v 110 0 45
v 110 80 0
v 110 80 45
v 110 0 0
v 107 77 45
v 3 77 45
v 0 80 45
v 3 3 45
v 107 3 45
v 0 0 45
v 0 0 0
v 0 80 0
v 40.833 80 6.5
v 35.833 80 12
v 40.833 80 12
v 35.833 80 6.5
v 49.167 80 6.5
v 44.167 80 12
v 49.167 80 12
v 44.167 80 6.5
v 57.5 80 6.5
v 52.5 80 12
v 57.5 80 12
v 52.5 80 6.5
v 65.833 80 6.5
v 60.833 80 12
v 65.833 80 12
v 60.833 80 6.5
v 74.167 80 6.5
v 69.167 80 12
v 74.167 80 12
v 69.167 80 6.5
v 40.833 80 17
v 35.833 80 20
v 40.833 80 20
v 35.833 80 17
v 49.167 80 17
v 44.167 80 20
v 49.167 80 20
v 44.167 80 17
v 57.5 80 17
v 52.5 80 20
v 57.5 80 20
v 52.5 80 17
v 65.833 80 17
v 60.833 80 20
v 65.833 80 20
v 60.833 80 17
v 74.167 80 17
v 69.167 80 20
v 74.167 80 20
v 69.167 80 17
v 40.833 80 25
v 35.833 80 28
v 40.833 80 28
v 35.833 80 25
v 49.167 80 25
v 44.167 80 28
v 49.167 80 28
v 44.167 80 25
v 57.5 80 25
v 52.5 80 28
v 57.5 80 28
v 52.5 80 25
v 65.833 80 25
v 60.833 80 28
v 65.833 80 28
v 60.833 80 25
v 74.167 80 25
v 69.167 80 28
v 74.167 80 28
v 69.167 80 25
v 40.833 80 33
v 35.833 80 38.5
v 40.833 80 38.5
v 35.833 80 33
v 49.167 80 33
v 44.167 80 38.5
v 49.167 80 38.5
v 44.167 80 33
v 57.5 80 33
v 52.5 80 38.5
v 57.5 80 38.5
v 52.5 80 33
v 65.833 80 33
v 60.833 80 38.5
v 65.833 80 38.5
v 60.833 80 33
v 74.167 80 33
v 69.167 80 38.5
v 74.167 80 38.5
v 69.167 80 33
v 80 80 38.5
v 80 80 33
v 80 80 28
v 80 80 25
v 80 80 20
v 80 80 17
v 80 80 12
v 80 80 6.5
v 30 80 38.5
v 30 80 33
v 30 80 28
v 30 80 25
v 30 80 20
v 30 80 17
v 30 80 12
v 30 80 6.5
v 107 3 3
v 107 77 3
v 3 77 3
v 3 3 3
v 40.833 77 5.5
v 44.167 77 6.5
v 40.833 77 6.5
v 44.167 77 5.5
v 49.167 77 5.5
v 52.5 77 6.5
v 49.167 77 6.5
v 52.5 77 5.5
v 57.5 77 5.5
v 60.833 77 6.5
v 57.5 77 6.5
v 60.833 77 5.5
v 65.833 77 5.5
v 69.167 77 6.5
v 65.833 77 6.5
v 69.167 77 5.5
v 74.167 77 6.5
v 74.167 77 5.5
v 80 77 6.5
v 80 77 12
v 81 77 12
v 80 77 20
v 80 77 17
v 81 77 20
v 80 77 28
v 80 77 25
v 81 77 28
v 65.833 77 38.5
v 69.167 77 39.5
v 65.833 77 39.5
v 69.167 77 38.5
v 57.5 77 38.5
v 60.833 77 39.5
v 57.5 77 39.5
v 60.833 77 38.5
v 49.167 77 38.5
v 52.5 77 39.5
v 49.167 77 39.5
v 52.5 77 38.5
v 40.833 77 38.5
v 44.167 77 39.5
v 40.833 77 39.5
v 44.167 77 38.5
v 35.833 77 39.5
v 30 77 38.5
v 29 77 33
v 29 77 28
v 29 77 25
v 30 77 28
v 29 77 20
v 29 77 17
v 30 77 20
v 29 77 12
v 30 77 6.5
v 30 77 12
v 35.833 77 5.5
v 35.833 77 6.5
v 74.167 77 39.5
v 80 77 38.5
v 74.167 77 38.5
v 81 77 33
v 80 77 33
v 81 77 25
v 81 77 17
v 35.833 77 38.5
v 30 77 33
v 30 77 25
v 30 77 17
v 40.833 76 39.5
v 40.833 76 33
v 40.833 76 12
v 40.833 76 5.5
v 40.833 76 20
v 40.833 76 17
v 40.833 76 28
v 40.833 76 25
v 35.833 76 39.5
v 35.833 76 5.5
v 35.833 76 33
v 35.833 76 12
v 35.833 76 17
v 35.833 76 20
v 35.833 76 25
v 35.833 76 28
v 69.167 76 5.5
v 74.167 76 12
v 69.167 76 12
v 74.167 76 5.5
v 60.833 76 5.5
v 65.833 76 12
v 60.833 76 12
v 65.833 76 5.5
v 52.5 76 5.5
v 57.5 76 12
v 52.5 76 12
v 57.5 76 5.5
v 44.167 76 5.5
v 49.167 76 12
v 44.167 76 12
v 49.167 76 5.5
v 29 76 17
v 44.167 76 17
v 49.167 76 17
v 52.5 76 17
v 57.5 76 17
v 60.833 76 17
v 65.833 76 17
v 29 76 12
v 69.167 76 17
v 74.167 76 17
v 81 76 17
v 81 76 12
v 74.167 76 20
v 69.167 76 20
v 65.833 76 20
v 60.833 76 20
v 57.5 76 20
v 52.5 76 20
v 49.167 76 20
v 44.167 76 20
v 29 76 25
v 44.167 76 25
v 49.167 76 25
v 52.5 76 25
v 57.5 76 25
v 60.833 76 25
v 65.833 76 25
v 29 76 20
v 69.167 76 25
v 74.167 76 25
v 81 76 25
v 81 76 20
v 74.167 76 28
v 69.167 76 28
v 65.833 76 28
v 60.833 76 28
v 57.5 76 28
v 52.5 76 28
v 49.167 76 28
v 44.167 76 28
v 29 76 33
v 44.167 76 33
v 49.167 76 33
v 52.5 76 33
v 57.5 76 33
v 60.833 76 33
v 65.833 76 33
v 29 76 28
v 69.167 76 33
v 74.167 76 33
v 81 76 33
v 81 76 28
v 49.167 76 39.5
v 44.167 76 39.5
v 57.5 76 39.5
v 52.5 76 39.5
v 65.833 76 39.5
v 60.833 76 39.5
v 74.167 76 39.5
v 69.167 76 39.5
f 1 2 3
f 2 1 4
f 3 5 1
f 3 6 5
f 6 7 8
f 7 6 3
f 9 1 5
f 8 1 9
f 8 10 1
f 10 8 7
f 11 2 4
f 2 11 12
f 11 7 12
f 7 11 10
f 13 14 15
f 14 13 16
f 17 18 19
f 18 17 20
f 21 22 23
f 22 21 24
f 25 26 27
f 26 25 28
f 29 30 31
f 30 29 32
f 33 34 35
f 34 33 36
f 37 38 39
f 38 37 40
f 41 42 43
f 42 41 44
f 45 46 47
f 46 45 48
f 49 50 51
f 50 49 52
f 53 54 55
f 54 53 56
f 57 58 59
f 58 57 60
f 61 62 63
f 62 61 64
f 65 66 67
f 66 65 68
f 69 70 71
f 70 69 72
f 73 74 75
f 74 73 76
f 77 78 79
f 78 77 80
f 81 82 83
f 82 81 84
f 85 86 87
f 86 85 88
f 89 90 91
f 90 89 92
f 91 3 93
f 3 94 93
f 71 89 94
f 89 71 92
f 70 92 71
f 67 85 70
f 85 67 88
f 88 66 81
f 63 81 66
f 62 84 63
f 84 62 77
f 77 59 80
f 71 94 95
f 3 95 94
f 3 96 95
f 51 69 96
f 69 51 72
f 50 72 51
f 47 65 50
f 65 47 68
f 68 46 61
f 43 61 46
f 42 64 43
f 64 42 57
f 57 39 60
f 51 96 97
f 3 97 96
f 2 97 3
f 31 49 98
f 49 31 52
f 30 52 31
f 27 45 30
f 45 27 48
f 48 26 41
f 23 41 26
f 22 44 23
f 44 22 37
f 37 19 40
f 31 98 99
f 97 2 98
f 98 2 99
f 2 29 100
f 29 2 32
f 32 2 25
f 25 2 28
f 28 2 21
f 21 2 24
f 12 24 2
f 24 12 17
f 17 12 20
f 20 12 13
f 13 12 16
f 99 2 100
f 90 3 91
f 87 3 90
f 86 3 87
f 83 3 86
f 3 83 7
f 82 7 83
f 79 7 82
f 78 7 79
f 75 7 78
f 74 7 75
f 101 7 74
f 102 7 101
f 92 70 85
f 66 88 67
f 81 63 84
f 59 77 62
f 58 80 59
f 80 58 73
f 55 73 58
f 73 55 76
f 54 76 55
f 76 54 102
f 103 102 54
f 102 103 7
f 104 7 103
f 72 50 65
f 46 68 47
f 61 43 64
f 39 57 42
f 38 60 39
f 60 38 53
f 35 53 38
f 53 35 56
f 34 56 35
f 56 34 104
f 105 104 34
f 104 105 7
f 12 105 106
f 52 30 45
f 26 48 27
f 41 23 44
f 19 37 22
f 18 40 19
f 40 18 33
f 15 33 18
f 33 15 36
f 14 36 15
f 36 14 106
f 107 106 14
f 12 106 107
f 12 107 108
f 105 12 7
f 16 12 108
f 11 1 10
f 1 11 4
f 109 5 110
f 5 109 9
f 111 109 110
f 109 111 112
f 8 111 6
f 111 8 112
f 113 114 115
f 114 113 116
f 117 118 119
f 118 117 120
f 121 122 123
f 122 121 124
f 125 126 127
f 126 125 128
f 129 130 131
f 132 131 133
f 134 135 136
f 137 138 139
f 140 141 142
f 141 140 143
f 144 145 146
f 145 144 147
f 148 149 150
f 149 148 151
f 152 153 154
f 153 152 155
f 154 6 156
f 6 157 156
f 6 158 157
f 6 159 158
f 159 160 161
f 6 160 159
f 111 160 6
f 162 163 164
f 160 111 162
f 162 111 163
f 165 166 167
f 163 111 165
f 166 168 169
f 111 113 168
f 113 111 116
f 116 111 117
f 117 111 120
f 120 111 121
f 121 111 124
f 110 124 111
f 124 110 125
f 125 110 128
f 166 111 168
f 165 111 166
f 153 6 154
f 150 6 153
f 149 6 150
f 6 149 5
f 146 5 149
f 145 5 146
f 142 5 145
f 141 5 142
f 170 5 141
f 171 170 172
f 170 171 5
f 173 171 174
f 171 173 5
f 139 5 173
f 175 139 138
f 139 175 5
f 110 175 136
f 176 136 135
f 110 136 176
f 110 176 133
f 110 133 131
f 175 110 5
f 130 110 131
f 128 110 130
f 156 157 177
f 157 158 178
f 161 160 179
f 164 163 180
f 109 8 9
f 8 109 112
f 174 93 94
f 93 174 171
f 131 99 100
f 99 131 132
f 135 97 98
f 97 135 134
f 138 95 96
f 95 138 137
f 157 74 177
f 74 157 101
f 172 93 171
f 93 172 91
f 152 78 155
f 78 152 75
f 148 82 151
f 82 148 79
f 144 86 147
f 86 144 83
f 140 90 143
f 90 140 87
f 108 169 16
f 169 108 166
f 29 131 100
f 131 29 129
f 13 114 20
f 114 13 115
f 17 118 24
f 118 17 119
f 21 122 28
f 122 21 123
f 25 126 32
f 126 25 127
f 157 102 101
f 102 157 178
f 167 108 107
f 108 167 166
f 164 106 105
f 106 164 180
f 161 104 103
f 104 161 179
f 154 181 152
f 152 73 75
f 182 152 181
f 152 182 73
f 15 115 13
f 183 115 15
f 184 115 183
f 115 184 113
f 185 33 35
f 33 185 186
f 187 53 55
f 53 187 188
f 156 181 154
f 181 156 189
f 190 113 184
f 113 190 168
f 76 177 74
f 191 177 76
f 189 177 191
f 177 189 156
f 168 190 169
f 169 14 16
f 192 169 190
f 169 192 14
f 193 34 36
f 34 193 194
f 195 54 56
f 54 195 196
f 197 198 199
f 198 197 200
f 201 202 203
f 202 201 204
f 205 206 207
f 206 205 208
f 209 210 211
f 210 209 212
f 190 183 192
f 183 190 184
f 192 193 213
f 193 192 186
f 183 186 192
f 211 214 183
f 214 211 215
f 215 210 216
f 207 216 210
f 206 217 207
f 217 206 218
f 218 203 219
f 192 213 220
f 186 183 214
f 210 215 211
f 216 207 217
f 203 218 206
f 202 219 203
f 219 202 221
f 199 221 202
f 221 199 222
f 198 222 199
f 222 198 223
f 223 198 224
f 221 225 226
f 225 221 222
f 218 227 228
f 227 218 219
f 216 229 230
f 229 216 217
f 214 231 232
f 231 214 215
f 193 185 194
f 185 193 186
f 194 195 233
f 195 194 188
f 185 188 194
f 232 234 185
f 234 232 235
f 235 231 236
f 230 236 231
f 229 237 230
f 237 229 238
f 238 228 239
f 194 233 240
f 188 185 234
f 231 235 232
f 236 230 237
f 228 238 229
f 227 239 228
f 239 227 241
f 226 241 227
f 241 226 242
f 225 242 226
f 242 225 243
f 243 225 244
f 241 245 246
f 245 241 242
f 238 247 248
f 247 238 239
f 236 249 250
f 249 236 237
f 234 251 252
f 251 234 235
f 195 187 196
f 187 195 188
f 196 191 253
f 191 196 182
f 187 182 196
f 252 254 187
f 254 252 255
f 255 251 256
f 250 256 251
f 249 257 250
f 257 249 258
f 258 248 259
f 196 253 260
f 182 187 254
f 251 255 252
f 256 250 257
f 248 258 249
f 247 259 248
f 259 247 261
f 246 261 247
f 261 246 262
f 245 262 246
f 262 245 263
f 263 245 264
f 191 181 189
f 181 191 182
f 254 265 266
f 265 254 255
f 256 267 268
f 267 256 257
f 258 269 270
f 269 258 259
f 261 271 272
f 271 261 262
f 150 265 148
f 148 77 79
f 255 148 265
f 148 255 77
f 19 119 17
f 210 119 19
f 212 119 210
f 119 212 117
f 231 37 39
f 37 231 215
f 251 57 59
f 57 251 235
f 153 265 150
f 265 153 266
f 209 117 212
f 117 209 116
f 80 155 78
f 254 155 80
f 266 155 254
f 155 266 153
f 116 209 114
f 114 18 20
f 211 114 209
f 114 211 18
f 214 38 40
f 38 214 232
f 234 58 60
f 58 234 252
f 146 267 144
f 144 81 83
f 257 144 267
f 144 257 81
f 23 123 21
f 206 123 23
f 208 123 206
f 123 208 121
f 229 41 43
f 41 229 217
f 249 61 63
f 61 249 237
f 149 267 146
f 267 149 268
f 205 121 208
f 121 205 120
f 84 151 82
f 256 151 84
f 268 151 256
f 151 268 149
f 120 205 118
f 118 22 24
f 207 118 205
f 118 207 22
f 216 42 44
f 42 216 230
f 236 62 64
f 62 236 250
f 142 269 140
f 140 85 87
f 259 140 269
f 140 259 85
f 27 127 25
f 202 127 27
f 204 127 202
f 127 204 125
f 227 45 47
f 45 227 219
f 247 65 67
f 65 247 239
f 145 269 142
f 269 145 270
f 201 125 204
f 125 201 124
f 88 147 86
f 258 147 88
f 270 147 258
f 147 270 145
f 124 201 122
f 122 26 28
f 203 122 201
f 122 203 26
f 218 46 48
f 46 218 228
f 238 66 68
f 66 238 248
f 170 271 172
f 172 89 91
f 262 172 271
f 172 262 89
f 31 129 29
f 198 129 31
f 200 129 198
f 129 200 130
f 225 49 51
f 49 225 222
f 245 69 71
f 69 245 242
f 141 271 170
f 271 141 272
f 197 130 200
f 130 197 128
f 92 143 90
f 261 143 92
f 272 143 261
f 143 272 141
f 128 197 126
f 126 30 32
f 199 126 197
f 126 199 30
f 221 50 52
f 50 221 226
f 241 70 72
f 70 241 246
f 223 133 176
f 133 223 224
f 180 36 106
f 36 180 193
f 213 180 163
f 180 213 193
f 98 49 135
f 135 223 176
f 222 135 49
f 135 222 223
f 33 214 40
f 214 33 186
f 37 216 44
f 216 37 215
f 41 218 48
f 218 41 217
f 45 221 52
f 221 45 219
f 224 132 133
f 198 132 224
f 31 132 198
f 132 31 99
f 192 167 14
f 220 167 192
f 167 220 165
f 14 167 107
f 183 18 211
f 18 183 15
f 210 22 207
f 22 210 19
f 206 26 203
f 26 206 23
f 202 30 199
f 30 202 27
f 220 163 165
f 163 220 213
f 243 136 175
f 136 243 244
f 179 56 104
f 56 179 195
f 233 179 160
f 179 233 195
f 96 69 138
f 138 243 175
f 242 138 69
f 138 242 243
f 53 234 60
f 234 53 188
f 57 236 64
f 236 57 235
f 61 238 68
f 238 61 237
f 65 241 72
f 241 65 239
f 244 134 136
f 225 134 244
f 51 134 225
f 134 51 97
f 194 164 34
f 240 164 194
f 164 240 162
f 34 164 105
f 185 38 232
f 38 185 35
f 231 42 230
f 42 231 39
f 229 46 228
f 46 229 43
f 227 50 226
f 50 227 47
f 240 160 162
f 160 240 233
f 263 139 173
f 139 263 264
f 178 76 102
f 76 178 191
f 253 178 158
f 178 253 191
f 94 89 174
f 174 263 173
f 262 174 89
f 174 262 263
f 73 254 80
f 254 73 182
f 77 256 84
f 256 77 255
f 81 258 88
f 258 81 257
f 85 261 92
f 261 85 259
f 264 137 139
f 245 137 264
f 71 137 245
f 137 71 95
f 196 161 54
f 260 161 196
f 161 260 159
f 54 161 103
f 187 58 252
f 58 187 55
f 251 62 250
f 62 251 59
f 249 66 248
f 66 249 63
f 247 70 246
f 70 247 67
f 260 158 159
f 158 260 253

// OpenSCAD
$fn = 32;

// ----------------------------------------------------------------------
// Vent box: crossgrid enclosure
// ----------------------------------------------------------------------

// --- parameters (mm) ---
box_l = 110;              // box length, X
box_w = 80;               // box width, Y
box_h = 45;               // box height, Z
wall_t = 3;               // shell wall thickness
win_l = 50;               // vent window width, X
win_h = 32;               // vent window height, Z
bar_w = 5;                // grid bar width
n_v = 5;                  // vertical bar count
n_h = 3;                  // horizontal bar count
fit_tol = 0.05;           // tolerance for press fits, mm
free_tol = 0.3;           // tolerance for clearance fits, mm

win_z0 = (box_h - win_h) / 2;  // window lower edge Z
v_step = win_l / (n_v + 1);  // vertical bar step
h_step = win_h / (n_h + 1);  // horizontal bar step

difference() {
  union() {
    difference() {
      cube([box_l, box_w, box_h]);
  translate([wall_t, wall_t, wall_t])
    cube([box_l - 2 * wall_t, box_w - 2 * wall_t, box_h]);
  translate([(box_l - win_l) / 2, box_w - wall_t - 1, win_z0])
    cube([win_l, wall_t + 2, win_h]);
    }
    for (i = [1 : n_v])
      translate([(box_l - win_l) / 2 + i * v_step - bar_w / 2,
                 box_w - wall_t - 1, win_z0 - 1])
        cube([bar_w, wall_t + 1, win_h + 2]);
    for (i = [1 : n_h])
      translate([(box_l - win_l) / 2 - 1, box_w - wall_t - 1,
                 win_z0 + i * h_step - bar_w / 2])
        cube([win_l + 2, wall_t + 1, bar_w]);
  }
}
